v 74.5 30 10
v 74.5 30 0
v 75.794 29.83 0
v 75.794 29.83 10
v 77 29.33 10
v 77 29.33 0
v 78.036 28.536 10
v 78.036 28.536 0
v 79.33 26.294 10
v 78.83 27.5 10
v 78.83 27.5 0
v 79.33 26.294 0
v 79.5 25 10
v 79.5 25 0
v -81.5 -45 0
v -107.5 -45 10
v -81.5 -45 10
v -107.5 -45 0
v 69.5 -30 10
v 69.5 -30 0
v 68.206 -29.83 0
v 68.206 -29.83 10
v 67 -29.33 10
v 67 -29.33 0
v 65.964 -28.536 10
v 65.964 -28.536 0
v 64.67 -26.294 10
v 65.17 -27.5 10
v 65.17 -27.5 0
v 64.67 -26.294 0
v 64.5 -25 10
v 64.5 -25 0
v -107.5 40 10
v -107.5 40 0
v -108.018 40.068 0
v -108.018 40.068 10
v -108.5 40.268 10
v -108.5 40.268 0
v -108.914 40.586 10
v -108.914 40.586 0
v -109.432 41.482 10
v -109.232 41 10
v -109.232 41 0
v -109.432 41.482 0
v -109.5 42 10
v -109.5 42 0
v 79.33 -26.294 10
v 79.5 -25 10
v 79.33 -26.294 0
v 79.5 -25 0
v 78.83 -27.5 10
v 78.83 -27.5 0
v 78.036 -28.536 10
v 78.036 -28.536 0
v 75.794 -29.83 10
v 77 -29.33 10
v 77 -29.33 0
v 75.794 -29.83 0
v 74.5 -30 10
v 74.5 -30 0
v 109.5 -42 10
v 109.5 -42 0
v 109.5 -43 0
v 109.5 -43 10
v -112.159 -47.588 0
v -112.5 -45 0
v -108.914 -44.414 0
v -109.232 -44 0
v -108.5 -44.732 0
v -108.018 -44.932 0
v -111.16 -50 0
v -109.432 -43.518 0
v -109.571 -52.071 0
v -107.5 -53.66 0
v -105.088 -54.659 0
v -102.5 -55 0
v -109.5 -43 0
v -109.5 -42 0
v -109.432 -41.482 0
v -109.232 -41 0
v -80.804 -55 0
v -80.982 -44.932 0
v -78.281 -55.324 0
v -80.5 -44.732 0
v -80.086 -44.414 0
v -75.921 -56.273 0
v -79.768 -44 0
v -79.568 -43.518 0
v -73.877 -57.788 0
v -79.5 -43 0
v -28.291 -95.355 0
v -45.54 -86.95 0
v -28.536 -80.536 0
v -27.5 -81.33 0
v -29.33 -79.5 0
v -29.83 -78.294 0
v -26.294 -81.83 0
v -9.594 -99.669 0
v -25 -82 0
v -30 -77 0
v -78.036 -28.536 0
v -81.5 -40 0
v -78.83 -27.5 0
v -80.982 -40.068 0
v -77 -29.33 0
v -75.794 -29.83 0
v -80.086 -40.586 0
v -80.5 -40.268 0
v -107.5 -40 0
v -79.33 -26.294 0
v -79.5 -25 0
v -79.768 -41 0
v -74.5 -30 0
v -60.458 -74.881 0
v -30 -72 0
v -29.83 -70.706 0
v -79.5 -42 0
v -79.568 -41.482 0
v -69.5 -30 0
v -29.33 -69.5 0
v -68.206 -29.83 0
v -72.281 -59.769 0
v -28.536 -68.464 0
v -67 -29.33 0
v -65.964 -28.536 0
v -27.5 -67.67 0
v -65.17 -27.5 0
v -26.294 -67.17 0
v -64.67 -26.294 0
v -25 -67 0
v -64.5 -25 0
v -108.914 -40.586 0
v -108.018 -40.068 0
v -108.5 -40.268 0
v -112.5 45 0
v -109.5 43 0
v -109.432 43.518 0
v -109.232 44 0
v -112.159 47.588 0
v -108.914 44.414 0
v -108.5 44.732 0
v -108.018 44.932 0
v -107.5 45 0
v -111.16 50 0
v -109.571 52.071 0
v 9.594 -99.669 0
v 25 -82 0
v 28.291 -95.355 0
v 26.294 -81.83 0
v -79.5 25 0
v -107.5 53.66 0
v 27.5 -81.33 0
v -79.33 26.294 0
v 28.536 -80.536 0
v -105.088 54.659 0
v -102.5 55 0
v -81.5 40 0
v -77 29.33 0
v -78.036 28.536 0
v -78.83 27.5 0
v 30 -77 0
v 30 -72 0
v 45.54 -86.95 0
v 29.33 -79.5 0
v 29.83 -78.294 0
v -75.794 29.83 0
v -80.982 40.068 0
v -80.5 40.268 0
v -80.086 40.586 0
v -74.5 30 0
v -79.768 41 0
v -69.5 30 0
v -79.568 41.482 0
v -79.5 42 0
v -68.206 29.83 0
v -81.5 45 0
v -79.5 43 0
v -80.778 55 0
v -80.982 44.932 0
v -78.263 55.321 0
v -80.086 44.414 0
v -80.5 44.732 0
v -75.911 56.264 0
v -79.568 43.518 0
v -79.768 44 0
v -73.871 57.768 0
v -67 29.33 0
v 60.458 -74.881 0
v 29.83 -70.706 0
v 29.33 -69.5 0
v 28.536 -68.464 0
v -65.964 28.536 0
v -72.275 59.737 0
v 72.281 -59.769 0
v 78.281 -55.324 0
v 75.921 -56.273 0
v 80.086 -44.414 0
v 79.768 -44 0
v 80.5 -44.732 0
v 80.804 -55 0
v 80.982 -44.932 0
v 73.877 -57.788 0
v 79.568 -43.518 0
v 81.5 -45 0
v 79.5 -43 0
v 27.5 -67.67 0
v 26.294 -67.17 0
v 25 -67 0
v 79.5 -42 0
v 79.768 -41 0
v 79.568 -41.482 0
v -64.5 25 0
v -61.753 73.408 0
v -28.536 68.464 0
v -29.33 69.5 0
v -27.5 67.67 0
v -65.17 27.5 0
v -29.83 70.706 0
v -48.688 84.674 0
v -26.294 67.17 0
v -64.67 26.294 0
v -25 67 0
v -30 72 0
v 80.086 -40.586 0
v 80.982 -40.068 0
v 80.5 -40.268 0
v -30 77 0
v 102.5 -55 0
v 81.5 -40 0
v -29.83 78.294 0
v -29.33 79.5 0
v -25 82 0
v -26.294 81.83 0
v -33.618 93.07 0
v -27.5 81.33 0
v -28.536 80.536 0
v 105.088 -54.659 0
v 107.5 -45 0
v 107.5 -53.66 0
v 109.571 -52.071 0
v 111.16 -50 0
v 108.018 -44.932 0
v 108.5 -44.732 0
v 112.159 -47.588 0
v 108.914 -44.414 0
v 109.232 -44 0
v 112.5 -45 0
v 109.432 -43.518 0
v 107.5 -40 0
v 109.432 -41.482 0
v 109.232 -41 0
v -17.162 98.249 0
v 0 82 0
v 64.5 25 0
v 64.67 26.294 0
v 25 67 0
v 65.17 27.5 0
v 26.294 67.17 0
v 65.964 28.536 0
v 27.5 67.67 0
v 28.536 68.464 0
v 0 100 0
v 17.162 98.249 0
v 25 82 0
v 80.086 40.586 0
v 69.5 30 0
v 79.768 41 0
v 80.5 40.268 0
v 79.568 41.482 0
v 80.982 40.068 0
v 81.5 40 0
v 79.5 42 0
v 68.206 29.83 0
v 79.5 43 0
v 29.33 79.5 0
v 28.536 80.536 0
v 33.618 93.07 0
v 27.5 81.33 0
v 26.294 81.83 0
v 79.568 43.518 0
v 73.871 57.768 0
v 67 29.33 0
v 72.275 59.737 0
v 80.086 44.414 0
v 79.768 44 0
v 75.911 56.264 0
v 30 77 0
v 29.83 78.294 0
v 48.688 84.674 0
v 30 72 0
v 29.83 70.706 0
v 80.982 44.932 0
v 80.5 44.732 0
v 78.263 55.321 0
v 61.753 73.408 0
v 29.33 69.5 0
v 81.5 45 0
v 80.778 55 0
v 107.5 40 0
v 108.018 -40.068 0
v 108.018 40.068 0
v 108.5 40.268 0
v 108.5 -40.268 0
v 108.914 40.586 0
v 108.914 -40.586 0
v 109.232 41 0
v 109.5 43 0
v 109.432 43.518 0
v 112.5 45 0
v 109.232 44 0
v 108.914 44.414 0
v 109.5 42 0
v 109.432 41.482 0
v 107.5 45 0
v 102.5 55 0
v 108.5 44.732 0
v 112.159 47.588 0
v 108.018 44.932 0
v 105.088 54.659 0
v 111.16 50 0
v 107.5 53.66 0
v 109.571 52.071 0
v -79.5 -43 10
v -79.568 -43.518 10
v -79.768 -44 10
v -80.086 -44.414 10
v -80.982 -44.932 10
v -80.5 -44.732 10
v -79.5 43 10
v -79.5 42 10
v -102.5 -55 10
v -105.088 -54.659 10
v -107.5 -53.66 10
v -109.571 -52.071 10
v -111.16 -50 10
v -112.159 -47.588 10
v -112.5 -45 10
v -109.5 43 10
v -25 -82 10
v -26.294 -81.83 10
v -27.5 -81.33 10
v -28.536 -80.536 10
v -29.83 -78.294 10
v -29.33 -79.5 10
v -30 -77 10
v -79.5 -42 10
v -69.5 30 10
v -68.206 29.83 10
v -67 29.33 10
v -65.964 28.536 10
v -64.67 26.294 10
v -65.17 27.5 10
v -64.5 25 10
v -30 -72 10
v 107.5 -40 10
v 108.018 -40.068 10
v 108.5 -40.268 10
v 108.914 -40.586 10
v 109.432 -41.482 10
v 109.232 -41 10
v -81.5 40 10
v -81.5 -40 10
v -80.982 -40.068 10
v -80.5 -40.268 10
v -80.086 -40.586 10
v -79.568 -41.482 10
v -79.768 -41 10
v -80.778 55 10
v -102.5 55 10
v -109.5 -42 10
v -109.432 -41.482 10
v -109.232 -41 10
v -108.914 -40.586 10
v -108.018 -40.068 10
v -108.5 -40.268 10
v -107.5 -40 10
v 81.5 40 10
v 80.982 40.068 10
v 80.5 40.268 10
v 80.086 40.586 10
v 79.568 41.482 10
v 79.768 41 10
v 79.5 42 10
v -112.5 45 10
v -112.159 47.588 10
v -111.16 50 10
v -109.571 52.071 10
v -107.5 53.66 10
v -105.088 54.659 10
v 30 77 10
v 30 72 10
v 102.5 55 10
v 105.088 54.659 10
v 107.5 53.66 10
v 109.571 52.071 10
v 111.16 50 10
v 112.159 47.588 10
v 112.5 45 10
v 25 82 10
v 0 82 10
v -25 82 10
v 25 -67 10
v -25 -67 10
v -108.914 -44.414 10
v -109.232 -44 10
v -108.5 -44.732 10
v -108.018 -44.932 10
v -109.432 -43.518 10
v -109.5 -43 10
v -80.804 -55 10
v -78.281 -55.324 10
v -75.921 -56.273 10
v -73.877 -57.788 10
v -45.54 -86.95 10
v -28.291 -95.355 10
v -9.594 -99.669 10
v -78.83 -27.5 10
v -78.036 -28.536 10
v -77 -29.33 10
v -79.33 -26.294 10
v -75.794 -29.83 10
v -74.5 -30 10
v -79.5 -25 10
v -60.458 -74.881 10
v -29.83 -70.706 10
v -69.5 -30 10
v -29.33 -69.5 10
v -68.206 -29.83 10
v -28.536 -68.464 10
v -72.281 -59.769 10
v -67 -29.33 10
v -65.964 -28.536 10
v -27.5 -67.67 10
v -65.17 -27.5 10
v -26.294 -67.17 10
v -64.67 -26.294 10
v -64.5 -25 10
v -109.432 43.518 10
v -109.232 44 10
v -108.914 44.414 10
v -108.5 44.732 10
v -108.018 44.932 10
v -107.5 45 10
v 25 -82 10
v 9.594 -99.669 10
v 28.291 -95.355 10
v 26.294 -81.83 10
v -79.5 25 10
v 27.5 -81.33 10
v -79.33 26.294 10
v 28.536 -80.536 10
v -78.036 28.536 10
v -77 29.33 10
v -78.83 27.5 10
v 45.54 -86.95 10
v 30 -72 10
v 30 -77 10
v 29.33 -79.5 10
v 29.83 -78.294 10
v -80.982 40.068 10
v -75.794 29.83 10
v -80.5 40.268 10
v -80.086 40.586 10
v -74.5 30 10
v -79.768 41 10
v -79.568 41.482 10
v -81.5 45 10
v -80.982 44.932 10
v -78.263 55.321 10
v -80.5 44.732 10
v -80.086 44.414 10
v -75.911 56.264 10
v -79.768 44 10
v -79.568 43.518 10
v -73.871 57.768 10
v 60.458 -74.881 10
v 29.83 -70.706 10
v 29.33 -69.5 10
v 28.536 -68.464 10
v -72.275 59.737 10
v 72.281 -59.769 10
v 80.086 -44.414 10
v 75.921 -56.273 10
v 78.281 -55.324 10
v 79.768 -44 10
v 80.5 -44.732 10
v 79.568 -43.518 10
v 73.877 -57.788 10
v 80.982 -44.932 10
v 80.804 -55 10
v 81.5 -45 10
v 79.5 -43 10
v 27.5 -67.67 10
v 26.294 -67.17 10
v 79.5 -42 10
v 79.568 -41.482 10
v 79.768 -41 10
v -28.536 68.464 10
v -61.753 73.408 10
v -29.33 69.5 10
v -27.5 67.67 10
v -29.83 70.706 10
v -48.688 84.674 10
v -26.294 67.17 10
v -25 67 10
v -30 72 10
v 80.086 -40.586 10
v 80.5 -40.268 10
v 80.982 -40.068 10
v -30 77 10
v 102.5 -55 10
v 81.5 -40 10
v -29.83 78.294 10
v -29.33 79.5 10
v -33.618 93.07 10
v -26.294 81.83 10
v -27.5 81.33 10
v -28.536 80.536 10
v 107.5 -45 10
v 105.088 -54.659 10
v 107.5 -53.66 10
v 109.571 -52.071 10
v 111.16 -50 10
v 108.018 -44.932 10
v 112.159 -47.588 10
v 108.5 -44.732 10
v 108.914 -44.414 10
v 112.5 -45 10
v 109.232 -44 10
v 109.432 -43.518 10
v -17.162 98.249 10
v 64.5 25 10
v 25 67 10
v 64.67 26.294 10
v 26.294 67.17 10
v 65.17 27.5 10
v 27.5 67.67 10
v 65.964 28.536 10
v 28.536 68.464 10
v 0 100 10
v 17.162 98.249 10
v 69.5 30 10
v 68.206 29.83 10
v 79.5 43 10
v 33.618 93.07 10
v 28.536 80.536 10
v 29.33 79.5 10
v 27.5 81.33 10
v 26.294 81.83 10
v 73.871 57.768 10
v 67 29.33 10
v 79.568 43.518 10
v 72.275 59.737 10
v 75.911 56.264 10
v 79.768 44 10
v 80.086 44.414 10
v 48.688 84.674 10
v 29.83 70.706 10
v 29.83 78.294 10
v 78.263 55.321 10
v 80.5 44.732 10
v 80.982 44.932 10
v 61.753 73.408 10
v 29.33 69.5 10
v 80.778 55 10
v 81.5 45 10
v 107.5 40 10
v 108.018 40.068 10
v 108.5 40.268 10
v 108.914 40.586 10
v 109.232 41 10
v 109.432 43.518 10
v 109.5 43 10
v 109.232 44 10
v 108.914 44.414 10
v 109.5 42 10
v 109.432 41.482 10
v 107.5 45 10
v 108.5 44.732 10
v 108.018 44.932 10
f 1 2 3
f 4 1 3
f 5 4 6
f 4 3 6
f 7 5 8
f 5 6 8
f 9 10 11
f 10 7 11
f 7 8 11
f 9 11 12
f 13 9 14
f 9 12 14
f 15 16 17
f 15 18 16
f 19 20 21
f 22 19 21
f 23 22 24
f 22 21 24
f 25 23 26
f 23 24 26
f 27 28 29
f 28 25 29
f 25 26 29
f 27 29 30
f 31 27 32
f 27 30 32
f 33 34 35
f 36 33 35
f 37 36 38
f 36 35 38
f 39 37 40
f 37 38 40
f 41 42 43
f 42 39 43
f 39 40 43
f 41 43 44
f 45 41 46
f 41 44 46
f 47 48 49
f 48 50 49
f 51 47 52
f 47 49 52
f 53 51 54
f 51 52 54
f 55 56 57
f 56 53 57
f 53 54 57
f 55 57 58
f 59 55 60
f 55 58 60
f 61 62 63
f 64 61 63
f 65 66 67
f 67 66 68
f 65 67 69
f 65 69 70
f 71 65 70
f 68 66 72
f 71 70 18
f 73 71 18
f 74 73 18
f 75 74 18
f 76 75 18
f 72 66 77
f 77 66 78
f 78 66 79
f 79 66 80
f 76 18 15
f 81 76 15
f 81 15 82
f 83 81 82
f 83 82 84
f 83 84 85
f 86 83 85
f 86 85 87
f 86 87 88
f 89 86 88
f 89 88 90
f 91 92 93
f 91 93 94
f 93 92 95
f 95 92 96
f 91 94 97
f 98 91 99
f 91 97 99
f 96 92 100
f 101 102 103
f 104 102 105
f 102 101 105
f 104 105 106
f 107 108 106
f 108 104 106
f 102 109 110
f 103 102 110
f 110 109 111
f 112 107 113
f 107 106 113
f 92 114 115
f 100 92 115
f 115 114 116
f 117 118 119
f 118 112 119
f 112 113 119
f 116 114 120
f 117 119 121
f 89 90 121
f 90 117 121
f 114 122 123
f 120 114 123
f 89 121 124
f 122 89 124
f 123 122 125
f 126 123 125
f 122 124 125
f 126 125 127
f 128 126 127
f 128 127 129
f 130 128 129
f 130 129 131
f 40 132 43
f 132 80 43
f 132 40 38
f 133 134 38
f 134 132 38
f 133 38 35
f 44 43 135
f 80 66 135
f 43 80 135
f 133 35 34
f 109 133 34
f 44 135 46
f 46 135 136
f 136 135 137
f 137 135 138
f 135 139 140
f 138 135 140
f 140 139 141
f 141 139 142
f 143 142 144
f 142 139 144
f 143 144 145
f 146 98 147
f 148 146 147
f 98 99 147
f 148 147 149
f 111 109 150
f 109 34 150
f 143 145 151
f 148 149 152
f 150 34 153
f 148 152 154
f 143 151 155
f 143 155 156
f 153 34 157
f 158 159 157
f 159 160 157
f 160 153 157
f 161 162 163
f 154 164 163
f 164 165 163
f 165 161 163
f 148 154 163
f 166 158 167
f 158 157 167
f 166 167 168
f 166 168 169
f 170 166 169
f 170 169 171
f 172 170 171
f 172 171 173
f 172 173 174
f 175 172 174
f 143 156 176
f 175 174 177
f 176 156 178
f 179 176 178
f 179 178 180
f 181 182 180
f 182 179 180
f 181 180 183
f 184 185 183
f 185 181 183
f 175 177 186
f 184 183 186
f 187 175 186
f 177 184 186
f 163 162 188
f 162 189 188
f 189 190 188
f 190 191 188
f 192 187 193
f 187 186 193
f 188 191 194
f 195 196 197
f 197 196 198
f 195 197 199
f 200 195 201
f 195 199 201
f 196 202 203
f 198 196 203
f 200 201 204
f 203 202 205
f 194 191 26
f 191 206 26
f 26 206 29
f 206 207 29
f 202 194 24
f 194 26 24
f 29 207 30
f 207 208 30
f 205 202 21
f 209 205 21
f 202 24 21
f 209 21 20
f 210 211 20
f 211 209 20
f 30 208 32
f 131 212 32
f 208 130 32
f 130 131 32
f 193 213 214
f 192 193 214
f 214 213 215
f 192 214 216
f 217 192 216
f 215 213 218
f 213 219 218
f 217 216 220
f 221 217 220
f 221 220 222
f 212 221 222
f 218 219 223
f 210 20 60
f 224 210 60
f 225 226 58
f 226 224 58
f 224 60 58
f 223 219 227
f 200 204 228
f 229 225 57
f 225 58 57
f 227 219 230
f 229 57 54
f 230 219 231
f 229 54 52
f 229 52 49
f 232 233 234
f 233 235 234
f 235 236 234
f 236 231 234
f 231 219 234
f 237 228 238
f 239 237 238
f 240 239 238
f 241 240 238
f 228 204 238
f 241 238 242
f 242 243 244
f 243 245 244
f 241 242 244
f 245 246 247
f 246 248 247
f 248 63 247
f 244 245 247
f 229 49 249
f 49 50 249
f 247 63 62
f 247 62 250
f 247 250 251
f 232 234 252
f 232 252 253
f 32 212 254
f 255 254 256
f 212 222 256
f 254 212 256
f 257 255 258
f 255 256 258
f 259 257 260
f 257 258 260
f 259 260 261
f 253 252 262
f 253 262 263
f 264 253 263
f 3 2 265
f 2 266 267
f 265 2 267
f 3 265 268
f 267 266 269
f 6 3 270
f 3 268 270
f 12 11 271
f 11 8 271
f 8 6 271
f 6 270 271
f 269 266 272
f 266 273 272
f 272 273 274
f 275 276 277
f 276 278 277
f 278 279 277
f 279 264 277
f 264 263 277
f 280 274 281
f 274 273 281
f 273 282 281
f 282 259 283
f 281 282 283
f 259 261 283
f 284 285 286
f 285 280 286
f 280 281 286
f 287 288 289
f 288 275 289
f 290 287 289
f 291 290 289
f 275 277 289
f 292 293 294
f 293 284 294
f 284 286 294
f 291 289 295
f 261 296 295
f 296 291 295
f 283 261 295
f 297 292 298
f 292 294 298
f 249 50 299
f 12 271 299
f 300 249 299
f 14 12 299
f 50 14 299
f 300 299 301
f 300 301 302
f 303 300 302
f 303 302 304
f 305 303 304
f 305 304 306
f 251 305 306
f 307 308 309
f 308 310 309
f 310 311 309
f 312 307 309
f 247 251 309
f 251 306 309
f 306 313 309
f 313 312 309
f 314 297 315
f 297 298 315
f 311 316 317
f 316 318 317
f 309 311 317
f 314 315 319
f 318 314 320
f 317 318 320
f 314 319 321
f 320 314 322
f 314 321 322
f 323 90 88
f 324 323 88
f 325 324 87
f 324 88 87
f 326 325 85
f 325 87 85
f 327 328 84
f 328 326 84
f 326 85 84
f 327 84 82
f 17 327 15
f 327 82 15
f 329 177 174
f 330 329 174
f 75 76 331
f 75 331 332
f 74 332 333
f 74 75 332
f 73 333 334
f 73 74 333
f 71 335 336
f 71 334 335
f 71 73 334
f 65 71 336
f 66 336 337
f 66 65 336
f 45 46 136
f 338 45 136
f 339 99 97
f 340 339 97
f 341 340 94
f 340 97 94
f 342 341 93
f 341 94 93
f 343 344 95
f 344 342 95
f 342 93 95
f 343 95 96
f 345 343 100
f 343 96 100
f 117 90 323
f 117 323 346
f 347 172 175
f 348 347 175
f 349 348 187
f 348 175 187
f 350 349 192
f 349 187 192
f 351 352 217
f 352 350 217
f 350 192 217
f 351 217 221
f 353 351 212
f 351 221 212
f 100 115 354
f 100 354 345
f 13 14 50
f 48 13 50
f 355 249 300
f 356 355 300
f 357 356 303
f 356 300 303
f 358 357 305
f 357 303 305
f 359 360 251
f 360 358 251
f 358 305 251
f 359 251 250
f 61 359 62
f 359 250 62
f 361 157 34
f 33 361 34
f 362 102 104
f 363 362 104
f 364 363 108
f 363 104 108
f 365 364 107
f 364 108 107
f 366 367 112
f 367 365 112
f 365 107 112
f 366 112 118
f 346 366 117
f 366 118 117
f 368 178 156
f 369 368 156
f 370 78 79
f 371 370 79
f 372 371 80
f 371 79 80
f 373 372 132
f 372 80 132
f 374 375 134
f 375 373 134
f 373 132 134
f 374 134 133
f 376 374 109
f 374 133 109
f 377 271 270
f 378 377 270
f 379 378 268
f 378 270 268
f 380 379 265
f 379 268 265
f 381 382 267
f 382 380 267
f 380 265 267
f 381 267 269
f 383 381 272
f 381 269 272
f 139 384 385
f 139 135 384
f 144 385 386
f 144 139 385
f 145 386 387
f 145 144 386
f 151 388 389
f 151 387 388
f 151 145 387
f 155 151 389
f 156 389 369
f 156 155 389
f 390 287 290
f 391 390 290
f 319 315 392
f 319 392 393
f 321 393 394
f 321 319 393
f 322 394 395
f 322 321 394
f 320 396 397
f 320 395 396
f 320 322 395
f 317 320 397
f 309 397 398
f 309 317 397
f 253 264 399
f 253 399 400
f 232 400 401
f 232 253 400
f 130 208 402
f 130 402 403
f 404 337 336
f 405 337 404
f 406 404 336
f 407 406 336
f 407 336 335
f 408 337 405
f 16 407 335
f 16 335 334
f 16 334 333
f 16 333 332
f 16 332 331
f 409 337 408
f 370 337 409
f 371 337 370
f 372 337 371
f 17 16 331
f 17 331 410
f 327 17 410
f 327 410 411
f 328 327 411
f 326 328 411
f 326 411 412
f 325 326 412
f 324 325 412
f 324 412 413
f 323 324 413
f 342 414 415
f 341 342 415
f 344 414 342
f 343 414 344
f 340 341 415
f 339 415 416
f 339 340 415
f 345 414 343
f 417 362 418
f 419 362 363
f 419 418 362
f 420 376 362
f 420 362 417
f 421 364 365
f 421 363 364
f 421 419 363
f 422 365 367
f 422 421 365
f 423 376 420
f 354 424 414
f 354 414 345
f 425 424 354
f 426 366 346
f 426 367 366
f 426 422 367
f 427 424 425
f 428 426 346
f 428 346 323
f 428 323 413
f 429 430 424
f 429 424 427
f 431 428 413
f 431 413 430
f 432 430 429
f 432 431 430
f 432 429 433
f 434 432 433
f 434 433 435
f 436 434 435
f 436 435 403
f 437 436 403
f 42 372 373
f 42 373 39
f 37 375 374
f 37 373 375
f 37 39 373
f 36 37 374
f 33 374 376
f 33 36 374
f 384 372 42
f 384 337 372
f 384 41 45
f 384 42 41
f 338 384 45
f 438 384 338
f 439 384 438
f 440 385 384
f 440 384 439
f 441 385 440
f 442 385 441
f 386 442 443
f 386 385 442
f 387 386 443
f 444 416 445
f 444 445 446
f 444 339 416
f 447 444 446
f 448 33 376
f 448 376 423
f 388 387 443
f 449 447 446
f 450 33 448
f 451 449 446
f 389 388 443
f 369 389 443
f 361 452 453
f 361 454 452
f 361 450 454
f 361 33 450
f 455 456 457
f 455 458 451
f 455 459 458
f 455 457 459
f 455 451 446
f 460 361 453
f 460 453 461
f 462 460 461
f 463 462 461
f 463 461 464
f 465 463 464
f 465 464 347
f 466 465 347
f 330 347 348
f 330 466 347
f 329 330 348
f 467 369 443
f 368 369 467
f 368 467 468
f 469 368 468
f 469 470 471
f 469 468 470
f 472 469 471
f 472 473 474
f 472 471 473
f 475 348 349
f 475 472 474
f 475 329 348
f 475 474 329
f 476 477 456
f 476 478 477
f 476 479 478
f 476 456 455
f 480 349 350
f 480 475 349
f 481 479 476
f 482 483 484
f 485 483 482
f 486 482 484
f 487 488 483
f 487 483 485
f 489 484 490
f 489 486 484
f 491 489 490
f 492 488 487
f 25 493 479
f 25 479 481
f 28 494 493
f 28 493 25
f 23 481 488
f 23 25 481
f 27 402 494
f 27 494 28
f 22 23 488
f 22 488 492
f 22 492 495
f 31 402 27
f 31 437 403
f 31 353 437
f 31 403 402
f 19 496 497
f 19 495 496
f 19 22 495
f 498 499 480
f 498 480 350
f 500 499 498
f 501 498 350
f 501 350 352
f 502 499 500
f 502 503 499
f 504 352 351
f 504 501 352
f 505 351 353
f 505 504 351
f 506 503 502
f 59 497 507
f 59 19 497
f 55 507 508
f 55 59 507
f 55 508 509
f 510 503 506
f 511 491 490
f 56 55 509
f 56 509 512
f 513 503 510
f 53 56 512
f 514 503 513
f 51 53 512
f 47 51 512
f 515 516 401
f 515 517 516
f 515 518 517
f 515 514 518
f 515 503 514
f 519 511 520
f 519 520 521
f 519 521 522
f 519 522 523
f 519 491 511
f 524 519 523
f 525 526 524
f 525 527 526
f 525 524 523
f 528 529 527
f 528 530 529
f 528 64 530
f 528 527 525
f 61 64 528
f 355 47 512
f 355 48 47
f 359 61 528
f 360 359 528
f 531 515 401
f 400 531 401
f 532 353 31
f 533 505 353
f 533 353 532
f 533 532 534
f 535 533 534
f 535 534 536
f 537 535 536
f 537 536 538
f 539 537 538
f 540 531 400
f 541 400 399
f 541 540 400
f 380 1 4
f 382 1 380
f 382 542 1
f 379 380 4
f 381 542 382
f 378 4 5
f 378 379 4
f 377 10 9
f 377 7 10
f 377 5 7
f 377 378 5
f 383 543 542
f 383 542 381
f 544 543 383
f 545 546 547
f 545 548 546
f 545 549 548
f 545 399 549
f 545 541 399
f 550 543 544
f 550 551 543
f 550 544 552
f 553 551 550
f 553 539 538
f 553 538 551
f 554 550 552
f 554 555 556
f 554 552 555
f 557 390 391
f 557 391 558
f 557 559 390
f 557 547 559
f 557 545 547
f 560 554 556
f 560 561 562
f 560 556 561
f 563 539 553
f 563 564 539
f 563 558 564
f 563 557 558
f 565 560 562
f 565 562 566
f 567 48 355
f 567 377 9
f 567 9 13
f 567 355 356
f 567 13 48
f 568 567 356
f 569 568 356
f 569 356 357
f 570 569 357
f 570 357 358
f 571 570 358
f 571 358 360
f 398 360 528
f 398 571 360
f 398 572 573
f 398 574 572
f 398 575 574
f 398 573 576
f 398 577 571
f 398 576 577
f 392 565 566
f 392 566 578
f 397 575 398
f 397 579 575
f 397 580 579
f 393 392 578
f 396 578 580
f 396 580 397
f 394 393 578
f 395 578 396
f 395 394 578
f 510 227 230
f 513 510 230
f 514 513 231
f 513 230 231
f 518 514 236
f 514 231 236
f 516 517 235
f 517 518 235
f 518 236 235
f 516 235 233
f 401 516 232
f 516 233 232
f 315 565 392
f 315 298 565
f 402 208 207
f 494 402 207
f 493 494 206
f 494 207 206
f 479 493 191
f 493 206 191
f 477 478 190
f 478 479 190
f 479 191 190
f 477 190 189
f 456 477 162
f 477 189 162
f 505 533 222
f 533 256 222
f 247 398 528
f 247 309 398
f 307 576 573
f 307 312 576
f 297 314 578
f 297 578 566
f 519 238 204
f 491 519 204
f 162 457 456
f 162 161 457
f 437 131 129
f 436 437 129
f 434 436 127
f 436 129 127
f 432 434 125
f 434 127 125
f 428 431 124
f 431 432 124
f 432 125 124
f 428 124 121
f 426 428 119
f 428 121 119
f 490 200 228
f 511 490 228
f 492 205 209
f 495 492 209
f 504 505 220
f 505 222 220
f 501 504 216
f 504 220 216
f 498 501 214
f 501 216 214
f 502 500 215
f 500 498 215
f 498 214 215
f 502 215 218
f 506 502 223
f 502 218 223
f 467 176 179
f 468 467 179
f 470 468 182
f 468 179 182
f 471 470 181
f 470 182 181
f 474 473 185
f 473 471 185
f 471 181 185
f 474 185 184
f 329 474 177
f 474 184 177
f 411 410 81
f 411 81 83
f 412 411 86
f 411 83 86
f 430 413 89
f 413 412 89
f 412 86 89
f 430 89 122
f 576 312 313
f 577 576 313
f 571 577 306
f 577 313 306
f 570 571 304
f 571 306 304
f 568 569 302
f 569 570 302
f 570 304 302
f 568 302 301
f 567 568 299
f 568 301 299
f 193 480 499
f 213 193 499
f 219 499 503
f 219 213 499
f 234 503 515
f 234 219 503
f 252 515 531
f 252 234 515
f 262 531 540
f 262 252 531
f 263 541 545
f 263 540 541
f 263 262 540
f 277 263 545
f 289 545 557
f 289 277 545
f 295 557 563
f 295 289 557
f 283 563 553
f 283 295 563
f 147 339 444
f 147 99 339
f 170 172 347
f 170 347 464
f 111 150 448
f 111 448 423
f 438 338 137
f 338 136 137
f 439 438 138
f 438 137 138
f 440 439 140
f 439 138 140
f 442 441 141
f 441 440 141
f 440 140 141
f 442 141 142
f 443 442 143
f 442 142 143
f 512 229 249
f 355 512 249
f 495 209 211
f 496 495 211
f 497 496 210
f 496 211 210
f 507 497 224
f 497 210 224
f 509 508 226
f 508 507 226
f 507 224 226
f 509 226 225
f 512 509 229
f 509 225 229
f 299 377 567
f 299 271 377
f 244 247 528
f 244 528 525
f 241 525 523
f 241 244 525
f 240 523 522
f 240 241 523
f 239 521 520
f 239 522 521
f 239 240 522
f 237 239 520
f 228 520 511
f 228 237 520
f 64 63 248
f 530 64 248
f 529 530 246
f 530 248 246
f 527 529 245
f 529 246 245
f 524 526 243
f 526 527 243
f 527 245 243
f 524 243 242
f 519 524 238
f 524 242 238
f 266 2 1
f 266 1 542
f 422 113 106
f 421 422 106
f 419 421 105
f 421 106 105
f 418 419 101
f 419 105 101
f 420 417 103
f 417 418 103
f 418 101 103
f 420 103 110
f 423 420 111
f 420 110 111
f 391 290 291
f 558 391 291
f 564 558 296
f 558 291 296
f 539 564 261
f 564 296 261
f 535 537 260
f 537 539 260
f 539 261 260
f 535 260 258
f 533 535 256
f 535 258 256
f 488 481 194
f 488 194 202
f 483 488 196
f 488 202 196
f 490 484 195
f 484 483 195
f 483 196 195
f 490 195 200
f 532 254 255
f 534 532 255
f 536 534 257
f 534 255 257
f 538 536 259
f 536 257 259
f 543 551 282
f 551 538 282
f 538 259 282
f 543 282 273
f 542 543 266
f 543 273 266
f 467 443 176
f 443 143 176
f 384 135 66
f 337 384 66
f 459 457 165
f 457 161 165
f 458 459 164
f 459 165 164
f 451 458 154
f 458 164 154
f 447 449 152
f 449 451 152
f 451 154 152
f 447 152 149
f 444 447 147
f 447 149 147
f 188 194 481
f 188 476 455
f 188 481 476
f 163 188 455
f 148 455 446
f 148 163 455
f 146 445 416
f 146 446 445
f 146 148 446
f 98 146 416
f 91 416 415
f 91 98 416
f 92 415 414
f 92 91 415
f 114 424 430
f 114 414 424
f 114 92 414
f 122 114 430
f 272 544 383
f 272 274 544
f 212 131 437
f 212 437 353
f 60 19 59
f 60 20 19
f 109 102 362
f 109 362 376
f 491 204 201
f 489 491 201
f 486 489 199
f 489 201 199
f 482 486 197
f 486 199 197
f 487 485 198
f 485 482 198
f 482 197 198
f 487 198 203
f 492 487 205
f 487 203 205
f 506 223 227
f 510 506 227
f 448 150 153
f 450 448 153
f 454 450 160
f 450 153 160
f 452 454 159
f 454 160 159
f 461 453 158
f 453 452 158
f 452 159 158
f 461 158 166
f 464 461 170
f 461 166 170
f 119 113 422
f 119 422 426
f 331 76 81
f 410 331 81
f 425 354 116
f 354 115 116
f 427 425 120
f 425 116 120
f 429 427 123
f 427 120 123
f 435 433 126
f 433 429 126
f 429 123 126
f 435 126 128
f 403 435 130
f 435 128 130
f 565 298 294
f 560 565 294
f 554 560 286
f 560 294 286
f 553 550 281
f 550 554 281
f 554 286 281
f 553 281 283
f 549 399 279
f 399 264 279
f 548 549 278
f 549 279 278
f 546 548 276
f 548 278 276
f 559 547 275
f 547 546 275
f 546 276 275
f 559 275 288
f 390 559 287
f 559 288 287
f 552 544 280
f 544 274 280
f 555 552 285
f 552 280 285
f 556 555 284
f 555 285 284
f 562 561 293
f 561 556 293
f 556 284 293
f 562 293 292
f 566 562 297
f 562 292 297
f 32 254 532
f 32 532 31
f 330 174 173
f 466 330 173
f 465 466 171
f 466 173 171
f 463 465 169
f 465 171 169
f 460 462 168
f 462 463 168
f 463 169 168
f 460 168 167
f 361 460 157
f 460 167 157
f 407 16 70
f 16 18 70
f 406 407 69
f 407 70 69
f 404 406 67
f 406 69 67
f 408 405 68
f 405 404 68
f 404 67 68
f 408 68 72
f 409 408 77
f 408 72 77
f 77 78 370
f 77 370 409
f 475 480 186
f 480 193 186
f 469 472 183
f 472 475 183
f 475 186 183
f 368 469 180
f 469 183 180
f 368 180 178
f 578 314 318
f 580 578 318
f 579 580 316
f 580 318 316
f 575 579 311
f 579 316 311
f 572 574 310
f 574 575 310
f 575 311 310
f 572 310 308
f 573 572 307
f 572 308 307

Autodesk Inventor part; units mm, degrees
ref_plane "YZ Plane" through (0, 0, 0) normal (1, 0, 0) x (0, 1, 0)
ref_plane "XZ Plane" through (0, 0, 0) normal (0, 1, 0) x (-1, 0, 0)
ref_plane "XY Plane" through (0, 0, 0) normal (0, 0, 1) x (1, 0, 0)
sketch "Sketch1" plane through (0, 0, 0) normal (0, 0, 1) x (1, 0, 0)
  line L0 (0, 0) -> (-112.5, 0) construction
  line L1 (-112.5, 0) -> (112.5, 0) construction
  line L2 (0, 0) -> (0, 100) construction
  line L3 (0, 100) -> (0, -100) construction
  line L4 (0, 0) -> (-75, 0) construction
  line L5 (-75, 0) -> (-75, -55) construction
  line L6 (0, 0) -> (75, 0) construction
  line L7 (75, 0) -> (75, -55) construction
  arc A0 (-72.2813, -59.7687) -> (72.2813, -59.7687) centre (0, -15.4013) ccw
  line L8 (-112.5, 0) -> (-112.5, -45)
  line L9 (-102.5, -55) -> (-80.8039, -55)
  line L10 (80.8039, -55) -> (102.5, -55)
  line L11 (112.5, -45) -> (112.5, 0)
  line L12 (-75, 0) -> (-75, 55) construction
  line L13 (75, 0) -> (75, 55) construction
  arc A1 (72.2746, 59.7368) -> (-72.2746, 59.7368) centre (0, 15) ccw
  line L14 (-80.7775, 55) -> (-102.5, 55)
  line L15 (-112.5, 45) -> (-112.5, 0)
  line L16 (80.7775, 55) -> (102.5, 55)
  line L17 (112.5, 45) -> (112.5, 0)
  arc A2 (-102.5, 55) -> (-112.5, 45) centre (-102.5, 45) ccw
  arc A3 (-80.7775, 55) -> (-72.2746, 59.7368) centre (-80.7775, 65) ccw
  arc A4 (72.2746, 59.7368) -> (80.7775, 55) centre (80.7775, 65) ccw
  arc A5 (112.5, 45) -> (102.5, 55) centre (102.5, 45) ccw
  arc A6 (102.5, -55) -> (112.5, -45) centre (102.5, -45) ccw
  arc A7 (80.8039, -55) -> (72.2813, -59.7687) centre (80.8039, -65) ccw
  arc A8 (-72.2813, -59.7687) -> (-80.8039, -55) centre (-80.8039, -65) ccw
  arc A9 (-112.5, -45) -> (-102.5, -55) centre (-102.5, -45) ccw
  line L18 (-72.2746, 59.7368) -> (-61.9878, 53.5577) construction
  line L19 (-61.9878, 53.5577) -> (-58.8982, 58.7011)
  line L20 (-58.8982, 58.7011) -> (-33.1812, 43.2534)
  line L21 (-33.1812, 43.2534) -> (-36.2707, 38.11)
  line L22 (-36.2707, 38.11) -> (-61.9878, 53.5577)
  line L23 (-58.8982, 58.7011) -> (-56.8385, 62.1301)
  line L24 (-56.8385, 62.1301) -> (-31.1215, 46.6823)
  line L25 (-31.1215, 46.6823) -> (-28.0319, 51.8257)
  line L26 (-28.0319, 51.8257) -> (-53.749, 67.2735)
  line L27 (-53.749, 67.2735) -> (-56.8385, 62.1301)
  line L28 (75.9108, 56.2641) -> (66.1713, 49.254) construction
  line L29 (66.1713, 49.254) -> (62.6662, 54.1238) construction
  line L30 (62.6662, 54.1238) -> (38.3174, 36.5986) construction
  line L31 (38.3174, 36.5986) -> (41.8224, 31.7289) construction
  line L32 (41.8224, 31.7289) -> (66.1713, 49.254) construction
  line L33 (62.6662, 54.1238) -> (56.8245, 62.2401) construction
  line L34 (56.8245, 62.2401) -> (60.3296, 57.3703) construction
  line L35 (60.3296, 57.3703) -> (35.9829, 39.842) construction
  line L36 (35.9829, 39.842) -> (32.4779, 44.7118) construction
  line L37 (32.4779, 44.7118) -> (56.8245, 62.2401) construction
  line L38 (-75, -55) -> (-66.4238, -46.6067) construction
  line L39 (-66.4238, -46.6067) -> (-55.2326, -58.0416) construction
  line L40 (-55.2326, -58.0416) -> (-59.4293, -53.7535) construction
  line L41 (-59.4293, -53.7535) -> (-37.9887, -32.7702) construction
  line L42 (-37.9887, -32.7702) -> (-33.792, -37.0583) construction
  line L43 (-55.2326, -58.0416) -> (-33.792, -37.0583) construction
  line L44 (-66.4238, -46.6067) -> (-62.2271, -50.8948) construction
  line L45 (-62.2271, -50.8948) -> (-40.7865, -29.9114) construction
  line L46 (-40.7865, -29.9114) -> (-44.9832, -25.6233) construction
  line L47 (-44.9832, -25.6233) -> (-66.4238, -46.6067) construction
  line L48 (66.1713, -50.8948) -> (57.2172, -64.1547) construction
  line L49 (57.2172, -64.1547) -> (60.3546, -59.0403) construction
  line L50 (60.3546, -59.0403) -> (34.7828, -43.3533) construction
  line L51 (34.7828, -43.3533) -> (31.6454, -48.4676) construction
  line L52 (57.2172, -64.1547) -> (31.6454, -48.4676) construction
  line L53 (66.1713, -50.8948) -> (62.8135, -55.8672) construction
  line L54 (62.8135, -55.8672) -> (37.2417, -40.1802) construction
  line L55 (37.2417, -40.1802) -> (40.3791, -35.0658) construction
  line L56 (0, 100) -> (0, 82)
  line L57 (0, 82) -> (-25, 82)
  line L58 (-30, 82) -> (25, 82)
  line L59 (30, 77) -> (30, 72)
  line L60 (25, 67) -> (-25, 67)
  line L61 (-30, 72) -> (-30, 77)
  arc A10 (-25, 82) -> (-30, 77) centre (-25, 77) ccw
  arc A11 (-30, 72) -> (-25, 67) centre (-25, 72) ccw
  arc A12 (25, 67) -> (30, 72) centre (25, 72) ccw
  arc A13 (30, 77) -> (25, 82) centre (25, 77) ccw
  line L62 (0, -100) -> (0, -82) construction
  line L63 (0, -82) -> (-25, -82)
  line L64 (-30, -82) -> (25, -82)
  line L65 (30, -77) -> (30, -72)
  line L66 (25, -67) -> (-25, -67)
  line L67 (-30, -72) -> (-30, -77)
  arc A14 (-25, -67) -> (-30, -72) centre (-25, -72) ccw
  arc A15 (-30, -77) -> (-25, -82) centre (-25, -77) ccw
  arc A16 (25, -82) -> (30, -77) centre (25, -77) ccw
  arc A17 (30, -72) -> (25, -67) centre (25, -72) ccw
  line L68 (66.1713, -50.8948) -> (40.3791, -35.0658) construction
  line L69 (102.5, 55) -> (102.5, 45) construction
  line L70 (112.5, 45) -> (109.5, 45) construction
  line L71 (107.5, 45) -> (81.5, 45)
  line L72 (79.5, 43) -> (79.5, 42)
  line L73 (81.5, 40) -> (107.5, 40)
  line L74 (109.5, 42) -> (109.5, 43)
  arc A18 (81.5, 45) -> (79.5, 43) centre (81.5, 43) ccw
  arc A19 (79.5, 42) -> (81.5, 40) centre (81.5, 42) ccw
  arc A20 (107.5, 40) -> (109.5, 42) centre (107.5, 42) ccw
  arc A21 (109.5, 43) -> (107.5, 45) centre (107.5, 43) ccw
  line L75 (102.5, -45) -> (102.5, -55) construction
  line L76 (112.5, -45) -> (109.5, -45) construction
  line L77 (107.5, -45) -> (81.5, -45)
  line L78 (79.5, -43) -> (79.5, -42)
  line L79 (81.5, -40) -> (107.5, -40)
  line L80 (109.5, -42) -> (109.5, -43)
  arc A22 (79.5, -43) -> (81.5, -45) centre (81.5, -43) ccw
  arc A23 (81.5, -40) -> (79.5, -42) centre (81.5, -42) ccw
  arc A24 (107.5, -45) -> (109.5, -43) centre (107.5, -43) ccw
  arc A25 (109.5, -42) -> (107.5, -40) centre (107.5, -42) ccw
  line L81 (79.5, -40) -> (79.5, -30) construction
  line L82 (79.5, 40) -> (79.5, 30) construction
  line L83 (74.5, 30) -> (69.5, 30)
  line L84 (64.5, 25) -> (64.5, -25)
  line L85 (69.5, -30) -> (74.5, -30)
  line L86 (79.5, 25) -> (79.5, -25)
  arc A26 (69.5, 30) -> (64.5, 25) centre (69.5, 25) ccw
  arc A27 (64.5, -25) -> (69.5, -30) centre (69.5, -25) ccw
  arc A28 (74.5, -30) -> (79.5, -25) centre (74.5, -25) ccw
  arc A29 (79.5, 25) -> (74.5, 30) centre (74.5, 25) ccw
  line L87 (-102.5, -55) -> (-102.5, -45) construction
  line L88 (-112.5, -45) -> (-109.5, -45) construction
  line L89 (-107.5, -45) -> (-81.5, -45)
  line L90 (-79.5, -43) -> (-79.5, -42)
  line L91 (-81.5, -40) -> (-107.5, -40)
  line L92 (-109.5, -42) -> (-109.5, -43)
  arc A30 (-107.5, -40) -> (-109.5, -42) centre (-107.5, -42) ccw
  arc A31 (-109.5, -43) -> (-107.5, -45) centre (-107.5, -43) ccw
  arc A32 (-81.5, -45) -> (-79.5, -43) centre (-81.5, -43) ccw
  arc A33 (-79.5, -42) -> (-81.5, -40) centre (-81.5, -42) ccw
  line L93 (-102.5, 55) -> (-102.5, 45) construction
  line L94 (-112.5, 45) -> (-109.5, 45) construction
  line L95 (-107.5, 45) -> (-81.5, 45)
  line L96 (-79.5, 43) -> (-79.5, 42)
  line L97 (-81.5, 40) -> (-107.5, 40)
  line L98 (-109.5, 42) -> (-109.5, 43)
  arc A34 (-107.5, 45) -> (-109.5, 43) centre (-107.5, 43) ccw
  arc A35 (-109.5, 42) -> (-107.5, 40) centre (-107.5, 42) ccw
  arc A36 (-81.5, 40) -> (-79.5, 42) centre (-81.5, 42) ccw
  arc A37 (-79.5, 43) -> (-81.5, 45) centre (-81.5, 43) ccw
  line L99 (-79.5, 40) -> (-79.5, 30) construction
  line L100 (-79.5, 25) -> (-79.5, -25) construction
  line L101 (-79.5, -40) -> (-79.5, -30) construction
  line L102 (-74.5, -30) -> (-69.5, -30)
  line L103 (-64.5, -25) -> (-64.5, 25)
  line L104 (-69.5, 30) -> (-74.5, 30)
  line L105 (-79.5, 30) -> (-79.5, -30)
  arc A38 (-74.5, 30) -> (-79.5, 25) centre (-74.5, 25) ccw
  arc A39 (-64.5, 25) -> (-69.5, 30) centre (-69.5, 25) ccw
  arc A40 (-69.5, -30) -> (-64.5, -25) centre (-69.5, -25) ccw
  arc A41 (-79.5, -25) -> (-74.5, -30) centre (-74.5, -25) ccw
  point P0 (112.5, -55)
  point P1 (30, 82)
  point P2 (30, 67)
  point P3 (30, -82)
  point P4 (30, -67)
  point P5 (79.5, 45)
  point P6 (79.5, -45)
  point P7 (64.5, 30)
  point P8 (-79.5, -45)
  point P9 (-79.5, 45)
  point P10 (-64.5, -30)
  dimension "d0" = 112.5
  dimension "d1" = 225
  dimension "d2" = 100
  dimension "d3" = 200
  dimension "d4" = 75
  dimension "d5" = 55
  dimension "d6" = 75
  dimension "d7" = 55
  dimension "d8" = 55
  dimension "d9" = 10
  dimension "d10" = 12
  dimension "d11" = 6
  dimension "d12" = 30
  dimension "d13" = 4
  dimension "d14" = 6
  dimension "d15" = 12
  dimension "d16" = 6
  dimension "d17" = 30
  dimension "d18" = 10
  dimension "d19" = 6
  dimension "d20" = 30
  dimension "d21" = 6
  dimension "d22" = 12
  dimension "d23" = 16
  dimension "d24" = 6
  dimension "d25" = 30
  dimension "d26" = 6
  dimension "d27" = 16
  dimension "d28" = 6
  dimension "d29" = 30
  dimension "d30" = 6
  dimension "d31" = 30
  dimension "d32" = 6
  dimension "d33" = 18
  dimension "d34" = 30
  dimension "d35" = 60
  dimension "d36" = 15
  dimension "d37" = 5
  dimension "d38" = 18
  dimension "d39" = 30
  dimension "d40" = 60
  dimension "d41" = 15
  dimension "d42" = 5
  dimension "d43" = 3
  dimension "d44" = 30
  dimension "d45" = 5
  dimension "d46" = 2
  dimension "d47" = 2
  dimension "d48" = 30
  dimension "d49" = 5
  dimension "d50" = 2
  dimension "d51" = 10
  dimension "d52" = 10
  dimension "d53" = 15
  dimension "d54" = 5
  dimension "d55" = 3
  dimension "d56" = 30
  dimension "d57" = 2
  dimension "d58" = 3
  dimension "d59" = 30
  dimension "d60" = 5
  dimension "d61" = 2
  dimension "d62" = 10
  dimension "d63" = 70
extrude "Extrusion1" add sketch "Sketch1" along normal blind 10 contours A8 L9 A9 L8 L15 A2 L14 A3 A1 A4 L16 A5 L17 L11 A6 L10 A7 A0 | L27 L26 L25 L24 | L19 L20 L21 L22
properties part number "dudukansayapdrone"
